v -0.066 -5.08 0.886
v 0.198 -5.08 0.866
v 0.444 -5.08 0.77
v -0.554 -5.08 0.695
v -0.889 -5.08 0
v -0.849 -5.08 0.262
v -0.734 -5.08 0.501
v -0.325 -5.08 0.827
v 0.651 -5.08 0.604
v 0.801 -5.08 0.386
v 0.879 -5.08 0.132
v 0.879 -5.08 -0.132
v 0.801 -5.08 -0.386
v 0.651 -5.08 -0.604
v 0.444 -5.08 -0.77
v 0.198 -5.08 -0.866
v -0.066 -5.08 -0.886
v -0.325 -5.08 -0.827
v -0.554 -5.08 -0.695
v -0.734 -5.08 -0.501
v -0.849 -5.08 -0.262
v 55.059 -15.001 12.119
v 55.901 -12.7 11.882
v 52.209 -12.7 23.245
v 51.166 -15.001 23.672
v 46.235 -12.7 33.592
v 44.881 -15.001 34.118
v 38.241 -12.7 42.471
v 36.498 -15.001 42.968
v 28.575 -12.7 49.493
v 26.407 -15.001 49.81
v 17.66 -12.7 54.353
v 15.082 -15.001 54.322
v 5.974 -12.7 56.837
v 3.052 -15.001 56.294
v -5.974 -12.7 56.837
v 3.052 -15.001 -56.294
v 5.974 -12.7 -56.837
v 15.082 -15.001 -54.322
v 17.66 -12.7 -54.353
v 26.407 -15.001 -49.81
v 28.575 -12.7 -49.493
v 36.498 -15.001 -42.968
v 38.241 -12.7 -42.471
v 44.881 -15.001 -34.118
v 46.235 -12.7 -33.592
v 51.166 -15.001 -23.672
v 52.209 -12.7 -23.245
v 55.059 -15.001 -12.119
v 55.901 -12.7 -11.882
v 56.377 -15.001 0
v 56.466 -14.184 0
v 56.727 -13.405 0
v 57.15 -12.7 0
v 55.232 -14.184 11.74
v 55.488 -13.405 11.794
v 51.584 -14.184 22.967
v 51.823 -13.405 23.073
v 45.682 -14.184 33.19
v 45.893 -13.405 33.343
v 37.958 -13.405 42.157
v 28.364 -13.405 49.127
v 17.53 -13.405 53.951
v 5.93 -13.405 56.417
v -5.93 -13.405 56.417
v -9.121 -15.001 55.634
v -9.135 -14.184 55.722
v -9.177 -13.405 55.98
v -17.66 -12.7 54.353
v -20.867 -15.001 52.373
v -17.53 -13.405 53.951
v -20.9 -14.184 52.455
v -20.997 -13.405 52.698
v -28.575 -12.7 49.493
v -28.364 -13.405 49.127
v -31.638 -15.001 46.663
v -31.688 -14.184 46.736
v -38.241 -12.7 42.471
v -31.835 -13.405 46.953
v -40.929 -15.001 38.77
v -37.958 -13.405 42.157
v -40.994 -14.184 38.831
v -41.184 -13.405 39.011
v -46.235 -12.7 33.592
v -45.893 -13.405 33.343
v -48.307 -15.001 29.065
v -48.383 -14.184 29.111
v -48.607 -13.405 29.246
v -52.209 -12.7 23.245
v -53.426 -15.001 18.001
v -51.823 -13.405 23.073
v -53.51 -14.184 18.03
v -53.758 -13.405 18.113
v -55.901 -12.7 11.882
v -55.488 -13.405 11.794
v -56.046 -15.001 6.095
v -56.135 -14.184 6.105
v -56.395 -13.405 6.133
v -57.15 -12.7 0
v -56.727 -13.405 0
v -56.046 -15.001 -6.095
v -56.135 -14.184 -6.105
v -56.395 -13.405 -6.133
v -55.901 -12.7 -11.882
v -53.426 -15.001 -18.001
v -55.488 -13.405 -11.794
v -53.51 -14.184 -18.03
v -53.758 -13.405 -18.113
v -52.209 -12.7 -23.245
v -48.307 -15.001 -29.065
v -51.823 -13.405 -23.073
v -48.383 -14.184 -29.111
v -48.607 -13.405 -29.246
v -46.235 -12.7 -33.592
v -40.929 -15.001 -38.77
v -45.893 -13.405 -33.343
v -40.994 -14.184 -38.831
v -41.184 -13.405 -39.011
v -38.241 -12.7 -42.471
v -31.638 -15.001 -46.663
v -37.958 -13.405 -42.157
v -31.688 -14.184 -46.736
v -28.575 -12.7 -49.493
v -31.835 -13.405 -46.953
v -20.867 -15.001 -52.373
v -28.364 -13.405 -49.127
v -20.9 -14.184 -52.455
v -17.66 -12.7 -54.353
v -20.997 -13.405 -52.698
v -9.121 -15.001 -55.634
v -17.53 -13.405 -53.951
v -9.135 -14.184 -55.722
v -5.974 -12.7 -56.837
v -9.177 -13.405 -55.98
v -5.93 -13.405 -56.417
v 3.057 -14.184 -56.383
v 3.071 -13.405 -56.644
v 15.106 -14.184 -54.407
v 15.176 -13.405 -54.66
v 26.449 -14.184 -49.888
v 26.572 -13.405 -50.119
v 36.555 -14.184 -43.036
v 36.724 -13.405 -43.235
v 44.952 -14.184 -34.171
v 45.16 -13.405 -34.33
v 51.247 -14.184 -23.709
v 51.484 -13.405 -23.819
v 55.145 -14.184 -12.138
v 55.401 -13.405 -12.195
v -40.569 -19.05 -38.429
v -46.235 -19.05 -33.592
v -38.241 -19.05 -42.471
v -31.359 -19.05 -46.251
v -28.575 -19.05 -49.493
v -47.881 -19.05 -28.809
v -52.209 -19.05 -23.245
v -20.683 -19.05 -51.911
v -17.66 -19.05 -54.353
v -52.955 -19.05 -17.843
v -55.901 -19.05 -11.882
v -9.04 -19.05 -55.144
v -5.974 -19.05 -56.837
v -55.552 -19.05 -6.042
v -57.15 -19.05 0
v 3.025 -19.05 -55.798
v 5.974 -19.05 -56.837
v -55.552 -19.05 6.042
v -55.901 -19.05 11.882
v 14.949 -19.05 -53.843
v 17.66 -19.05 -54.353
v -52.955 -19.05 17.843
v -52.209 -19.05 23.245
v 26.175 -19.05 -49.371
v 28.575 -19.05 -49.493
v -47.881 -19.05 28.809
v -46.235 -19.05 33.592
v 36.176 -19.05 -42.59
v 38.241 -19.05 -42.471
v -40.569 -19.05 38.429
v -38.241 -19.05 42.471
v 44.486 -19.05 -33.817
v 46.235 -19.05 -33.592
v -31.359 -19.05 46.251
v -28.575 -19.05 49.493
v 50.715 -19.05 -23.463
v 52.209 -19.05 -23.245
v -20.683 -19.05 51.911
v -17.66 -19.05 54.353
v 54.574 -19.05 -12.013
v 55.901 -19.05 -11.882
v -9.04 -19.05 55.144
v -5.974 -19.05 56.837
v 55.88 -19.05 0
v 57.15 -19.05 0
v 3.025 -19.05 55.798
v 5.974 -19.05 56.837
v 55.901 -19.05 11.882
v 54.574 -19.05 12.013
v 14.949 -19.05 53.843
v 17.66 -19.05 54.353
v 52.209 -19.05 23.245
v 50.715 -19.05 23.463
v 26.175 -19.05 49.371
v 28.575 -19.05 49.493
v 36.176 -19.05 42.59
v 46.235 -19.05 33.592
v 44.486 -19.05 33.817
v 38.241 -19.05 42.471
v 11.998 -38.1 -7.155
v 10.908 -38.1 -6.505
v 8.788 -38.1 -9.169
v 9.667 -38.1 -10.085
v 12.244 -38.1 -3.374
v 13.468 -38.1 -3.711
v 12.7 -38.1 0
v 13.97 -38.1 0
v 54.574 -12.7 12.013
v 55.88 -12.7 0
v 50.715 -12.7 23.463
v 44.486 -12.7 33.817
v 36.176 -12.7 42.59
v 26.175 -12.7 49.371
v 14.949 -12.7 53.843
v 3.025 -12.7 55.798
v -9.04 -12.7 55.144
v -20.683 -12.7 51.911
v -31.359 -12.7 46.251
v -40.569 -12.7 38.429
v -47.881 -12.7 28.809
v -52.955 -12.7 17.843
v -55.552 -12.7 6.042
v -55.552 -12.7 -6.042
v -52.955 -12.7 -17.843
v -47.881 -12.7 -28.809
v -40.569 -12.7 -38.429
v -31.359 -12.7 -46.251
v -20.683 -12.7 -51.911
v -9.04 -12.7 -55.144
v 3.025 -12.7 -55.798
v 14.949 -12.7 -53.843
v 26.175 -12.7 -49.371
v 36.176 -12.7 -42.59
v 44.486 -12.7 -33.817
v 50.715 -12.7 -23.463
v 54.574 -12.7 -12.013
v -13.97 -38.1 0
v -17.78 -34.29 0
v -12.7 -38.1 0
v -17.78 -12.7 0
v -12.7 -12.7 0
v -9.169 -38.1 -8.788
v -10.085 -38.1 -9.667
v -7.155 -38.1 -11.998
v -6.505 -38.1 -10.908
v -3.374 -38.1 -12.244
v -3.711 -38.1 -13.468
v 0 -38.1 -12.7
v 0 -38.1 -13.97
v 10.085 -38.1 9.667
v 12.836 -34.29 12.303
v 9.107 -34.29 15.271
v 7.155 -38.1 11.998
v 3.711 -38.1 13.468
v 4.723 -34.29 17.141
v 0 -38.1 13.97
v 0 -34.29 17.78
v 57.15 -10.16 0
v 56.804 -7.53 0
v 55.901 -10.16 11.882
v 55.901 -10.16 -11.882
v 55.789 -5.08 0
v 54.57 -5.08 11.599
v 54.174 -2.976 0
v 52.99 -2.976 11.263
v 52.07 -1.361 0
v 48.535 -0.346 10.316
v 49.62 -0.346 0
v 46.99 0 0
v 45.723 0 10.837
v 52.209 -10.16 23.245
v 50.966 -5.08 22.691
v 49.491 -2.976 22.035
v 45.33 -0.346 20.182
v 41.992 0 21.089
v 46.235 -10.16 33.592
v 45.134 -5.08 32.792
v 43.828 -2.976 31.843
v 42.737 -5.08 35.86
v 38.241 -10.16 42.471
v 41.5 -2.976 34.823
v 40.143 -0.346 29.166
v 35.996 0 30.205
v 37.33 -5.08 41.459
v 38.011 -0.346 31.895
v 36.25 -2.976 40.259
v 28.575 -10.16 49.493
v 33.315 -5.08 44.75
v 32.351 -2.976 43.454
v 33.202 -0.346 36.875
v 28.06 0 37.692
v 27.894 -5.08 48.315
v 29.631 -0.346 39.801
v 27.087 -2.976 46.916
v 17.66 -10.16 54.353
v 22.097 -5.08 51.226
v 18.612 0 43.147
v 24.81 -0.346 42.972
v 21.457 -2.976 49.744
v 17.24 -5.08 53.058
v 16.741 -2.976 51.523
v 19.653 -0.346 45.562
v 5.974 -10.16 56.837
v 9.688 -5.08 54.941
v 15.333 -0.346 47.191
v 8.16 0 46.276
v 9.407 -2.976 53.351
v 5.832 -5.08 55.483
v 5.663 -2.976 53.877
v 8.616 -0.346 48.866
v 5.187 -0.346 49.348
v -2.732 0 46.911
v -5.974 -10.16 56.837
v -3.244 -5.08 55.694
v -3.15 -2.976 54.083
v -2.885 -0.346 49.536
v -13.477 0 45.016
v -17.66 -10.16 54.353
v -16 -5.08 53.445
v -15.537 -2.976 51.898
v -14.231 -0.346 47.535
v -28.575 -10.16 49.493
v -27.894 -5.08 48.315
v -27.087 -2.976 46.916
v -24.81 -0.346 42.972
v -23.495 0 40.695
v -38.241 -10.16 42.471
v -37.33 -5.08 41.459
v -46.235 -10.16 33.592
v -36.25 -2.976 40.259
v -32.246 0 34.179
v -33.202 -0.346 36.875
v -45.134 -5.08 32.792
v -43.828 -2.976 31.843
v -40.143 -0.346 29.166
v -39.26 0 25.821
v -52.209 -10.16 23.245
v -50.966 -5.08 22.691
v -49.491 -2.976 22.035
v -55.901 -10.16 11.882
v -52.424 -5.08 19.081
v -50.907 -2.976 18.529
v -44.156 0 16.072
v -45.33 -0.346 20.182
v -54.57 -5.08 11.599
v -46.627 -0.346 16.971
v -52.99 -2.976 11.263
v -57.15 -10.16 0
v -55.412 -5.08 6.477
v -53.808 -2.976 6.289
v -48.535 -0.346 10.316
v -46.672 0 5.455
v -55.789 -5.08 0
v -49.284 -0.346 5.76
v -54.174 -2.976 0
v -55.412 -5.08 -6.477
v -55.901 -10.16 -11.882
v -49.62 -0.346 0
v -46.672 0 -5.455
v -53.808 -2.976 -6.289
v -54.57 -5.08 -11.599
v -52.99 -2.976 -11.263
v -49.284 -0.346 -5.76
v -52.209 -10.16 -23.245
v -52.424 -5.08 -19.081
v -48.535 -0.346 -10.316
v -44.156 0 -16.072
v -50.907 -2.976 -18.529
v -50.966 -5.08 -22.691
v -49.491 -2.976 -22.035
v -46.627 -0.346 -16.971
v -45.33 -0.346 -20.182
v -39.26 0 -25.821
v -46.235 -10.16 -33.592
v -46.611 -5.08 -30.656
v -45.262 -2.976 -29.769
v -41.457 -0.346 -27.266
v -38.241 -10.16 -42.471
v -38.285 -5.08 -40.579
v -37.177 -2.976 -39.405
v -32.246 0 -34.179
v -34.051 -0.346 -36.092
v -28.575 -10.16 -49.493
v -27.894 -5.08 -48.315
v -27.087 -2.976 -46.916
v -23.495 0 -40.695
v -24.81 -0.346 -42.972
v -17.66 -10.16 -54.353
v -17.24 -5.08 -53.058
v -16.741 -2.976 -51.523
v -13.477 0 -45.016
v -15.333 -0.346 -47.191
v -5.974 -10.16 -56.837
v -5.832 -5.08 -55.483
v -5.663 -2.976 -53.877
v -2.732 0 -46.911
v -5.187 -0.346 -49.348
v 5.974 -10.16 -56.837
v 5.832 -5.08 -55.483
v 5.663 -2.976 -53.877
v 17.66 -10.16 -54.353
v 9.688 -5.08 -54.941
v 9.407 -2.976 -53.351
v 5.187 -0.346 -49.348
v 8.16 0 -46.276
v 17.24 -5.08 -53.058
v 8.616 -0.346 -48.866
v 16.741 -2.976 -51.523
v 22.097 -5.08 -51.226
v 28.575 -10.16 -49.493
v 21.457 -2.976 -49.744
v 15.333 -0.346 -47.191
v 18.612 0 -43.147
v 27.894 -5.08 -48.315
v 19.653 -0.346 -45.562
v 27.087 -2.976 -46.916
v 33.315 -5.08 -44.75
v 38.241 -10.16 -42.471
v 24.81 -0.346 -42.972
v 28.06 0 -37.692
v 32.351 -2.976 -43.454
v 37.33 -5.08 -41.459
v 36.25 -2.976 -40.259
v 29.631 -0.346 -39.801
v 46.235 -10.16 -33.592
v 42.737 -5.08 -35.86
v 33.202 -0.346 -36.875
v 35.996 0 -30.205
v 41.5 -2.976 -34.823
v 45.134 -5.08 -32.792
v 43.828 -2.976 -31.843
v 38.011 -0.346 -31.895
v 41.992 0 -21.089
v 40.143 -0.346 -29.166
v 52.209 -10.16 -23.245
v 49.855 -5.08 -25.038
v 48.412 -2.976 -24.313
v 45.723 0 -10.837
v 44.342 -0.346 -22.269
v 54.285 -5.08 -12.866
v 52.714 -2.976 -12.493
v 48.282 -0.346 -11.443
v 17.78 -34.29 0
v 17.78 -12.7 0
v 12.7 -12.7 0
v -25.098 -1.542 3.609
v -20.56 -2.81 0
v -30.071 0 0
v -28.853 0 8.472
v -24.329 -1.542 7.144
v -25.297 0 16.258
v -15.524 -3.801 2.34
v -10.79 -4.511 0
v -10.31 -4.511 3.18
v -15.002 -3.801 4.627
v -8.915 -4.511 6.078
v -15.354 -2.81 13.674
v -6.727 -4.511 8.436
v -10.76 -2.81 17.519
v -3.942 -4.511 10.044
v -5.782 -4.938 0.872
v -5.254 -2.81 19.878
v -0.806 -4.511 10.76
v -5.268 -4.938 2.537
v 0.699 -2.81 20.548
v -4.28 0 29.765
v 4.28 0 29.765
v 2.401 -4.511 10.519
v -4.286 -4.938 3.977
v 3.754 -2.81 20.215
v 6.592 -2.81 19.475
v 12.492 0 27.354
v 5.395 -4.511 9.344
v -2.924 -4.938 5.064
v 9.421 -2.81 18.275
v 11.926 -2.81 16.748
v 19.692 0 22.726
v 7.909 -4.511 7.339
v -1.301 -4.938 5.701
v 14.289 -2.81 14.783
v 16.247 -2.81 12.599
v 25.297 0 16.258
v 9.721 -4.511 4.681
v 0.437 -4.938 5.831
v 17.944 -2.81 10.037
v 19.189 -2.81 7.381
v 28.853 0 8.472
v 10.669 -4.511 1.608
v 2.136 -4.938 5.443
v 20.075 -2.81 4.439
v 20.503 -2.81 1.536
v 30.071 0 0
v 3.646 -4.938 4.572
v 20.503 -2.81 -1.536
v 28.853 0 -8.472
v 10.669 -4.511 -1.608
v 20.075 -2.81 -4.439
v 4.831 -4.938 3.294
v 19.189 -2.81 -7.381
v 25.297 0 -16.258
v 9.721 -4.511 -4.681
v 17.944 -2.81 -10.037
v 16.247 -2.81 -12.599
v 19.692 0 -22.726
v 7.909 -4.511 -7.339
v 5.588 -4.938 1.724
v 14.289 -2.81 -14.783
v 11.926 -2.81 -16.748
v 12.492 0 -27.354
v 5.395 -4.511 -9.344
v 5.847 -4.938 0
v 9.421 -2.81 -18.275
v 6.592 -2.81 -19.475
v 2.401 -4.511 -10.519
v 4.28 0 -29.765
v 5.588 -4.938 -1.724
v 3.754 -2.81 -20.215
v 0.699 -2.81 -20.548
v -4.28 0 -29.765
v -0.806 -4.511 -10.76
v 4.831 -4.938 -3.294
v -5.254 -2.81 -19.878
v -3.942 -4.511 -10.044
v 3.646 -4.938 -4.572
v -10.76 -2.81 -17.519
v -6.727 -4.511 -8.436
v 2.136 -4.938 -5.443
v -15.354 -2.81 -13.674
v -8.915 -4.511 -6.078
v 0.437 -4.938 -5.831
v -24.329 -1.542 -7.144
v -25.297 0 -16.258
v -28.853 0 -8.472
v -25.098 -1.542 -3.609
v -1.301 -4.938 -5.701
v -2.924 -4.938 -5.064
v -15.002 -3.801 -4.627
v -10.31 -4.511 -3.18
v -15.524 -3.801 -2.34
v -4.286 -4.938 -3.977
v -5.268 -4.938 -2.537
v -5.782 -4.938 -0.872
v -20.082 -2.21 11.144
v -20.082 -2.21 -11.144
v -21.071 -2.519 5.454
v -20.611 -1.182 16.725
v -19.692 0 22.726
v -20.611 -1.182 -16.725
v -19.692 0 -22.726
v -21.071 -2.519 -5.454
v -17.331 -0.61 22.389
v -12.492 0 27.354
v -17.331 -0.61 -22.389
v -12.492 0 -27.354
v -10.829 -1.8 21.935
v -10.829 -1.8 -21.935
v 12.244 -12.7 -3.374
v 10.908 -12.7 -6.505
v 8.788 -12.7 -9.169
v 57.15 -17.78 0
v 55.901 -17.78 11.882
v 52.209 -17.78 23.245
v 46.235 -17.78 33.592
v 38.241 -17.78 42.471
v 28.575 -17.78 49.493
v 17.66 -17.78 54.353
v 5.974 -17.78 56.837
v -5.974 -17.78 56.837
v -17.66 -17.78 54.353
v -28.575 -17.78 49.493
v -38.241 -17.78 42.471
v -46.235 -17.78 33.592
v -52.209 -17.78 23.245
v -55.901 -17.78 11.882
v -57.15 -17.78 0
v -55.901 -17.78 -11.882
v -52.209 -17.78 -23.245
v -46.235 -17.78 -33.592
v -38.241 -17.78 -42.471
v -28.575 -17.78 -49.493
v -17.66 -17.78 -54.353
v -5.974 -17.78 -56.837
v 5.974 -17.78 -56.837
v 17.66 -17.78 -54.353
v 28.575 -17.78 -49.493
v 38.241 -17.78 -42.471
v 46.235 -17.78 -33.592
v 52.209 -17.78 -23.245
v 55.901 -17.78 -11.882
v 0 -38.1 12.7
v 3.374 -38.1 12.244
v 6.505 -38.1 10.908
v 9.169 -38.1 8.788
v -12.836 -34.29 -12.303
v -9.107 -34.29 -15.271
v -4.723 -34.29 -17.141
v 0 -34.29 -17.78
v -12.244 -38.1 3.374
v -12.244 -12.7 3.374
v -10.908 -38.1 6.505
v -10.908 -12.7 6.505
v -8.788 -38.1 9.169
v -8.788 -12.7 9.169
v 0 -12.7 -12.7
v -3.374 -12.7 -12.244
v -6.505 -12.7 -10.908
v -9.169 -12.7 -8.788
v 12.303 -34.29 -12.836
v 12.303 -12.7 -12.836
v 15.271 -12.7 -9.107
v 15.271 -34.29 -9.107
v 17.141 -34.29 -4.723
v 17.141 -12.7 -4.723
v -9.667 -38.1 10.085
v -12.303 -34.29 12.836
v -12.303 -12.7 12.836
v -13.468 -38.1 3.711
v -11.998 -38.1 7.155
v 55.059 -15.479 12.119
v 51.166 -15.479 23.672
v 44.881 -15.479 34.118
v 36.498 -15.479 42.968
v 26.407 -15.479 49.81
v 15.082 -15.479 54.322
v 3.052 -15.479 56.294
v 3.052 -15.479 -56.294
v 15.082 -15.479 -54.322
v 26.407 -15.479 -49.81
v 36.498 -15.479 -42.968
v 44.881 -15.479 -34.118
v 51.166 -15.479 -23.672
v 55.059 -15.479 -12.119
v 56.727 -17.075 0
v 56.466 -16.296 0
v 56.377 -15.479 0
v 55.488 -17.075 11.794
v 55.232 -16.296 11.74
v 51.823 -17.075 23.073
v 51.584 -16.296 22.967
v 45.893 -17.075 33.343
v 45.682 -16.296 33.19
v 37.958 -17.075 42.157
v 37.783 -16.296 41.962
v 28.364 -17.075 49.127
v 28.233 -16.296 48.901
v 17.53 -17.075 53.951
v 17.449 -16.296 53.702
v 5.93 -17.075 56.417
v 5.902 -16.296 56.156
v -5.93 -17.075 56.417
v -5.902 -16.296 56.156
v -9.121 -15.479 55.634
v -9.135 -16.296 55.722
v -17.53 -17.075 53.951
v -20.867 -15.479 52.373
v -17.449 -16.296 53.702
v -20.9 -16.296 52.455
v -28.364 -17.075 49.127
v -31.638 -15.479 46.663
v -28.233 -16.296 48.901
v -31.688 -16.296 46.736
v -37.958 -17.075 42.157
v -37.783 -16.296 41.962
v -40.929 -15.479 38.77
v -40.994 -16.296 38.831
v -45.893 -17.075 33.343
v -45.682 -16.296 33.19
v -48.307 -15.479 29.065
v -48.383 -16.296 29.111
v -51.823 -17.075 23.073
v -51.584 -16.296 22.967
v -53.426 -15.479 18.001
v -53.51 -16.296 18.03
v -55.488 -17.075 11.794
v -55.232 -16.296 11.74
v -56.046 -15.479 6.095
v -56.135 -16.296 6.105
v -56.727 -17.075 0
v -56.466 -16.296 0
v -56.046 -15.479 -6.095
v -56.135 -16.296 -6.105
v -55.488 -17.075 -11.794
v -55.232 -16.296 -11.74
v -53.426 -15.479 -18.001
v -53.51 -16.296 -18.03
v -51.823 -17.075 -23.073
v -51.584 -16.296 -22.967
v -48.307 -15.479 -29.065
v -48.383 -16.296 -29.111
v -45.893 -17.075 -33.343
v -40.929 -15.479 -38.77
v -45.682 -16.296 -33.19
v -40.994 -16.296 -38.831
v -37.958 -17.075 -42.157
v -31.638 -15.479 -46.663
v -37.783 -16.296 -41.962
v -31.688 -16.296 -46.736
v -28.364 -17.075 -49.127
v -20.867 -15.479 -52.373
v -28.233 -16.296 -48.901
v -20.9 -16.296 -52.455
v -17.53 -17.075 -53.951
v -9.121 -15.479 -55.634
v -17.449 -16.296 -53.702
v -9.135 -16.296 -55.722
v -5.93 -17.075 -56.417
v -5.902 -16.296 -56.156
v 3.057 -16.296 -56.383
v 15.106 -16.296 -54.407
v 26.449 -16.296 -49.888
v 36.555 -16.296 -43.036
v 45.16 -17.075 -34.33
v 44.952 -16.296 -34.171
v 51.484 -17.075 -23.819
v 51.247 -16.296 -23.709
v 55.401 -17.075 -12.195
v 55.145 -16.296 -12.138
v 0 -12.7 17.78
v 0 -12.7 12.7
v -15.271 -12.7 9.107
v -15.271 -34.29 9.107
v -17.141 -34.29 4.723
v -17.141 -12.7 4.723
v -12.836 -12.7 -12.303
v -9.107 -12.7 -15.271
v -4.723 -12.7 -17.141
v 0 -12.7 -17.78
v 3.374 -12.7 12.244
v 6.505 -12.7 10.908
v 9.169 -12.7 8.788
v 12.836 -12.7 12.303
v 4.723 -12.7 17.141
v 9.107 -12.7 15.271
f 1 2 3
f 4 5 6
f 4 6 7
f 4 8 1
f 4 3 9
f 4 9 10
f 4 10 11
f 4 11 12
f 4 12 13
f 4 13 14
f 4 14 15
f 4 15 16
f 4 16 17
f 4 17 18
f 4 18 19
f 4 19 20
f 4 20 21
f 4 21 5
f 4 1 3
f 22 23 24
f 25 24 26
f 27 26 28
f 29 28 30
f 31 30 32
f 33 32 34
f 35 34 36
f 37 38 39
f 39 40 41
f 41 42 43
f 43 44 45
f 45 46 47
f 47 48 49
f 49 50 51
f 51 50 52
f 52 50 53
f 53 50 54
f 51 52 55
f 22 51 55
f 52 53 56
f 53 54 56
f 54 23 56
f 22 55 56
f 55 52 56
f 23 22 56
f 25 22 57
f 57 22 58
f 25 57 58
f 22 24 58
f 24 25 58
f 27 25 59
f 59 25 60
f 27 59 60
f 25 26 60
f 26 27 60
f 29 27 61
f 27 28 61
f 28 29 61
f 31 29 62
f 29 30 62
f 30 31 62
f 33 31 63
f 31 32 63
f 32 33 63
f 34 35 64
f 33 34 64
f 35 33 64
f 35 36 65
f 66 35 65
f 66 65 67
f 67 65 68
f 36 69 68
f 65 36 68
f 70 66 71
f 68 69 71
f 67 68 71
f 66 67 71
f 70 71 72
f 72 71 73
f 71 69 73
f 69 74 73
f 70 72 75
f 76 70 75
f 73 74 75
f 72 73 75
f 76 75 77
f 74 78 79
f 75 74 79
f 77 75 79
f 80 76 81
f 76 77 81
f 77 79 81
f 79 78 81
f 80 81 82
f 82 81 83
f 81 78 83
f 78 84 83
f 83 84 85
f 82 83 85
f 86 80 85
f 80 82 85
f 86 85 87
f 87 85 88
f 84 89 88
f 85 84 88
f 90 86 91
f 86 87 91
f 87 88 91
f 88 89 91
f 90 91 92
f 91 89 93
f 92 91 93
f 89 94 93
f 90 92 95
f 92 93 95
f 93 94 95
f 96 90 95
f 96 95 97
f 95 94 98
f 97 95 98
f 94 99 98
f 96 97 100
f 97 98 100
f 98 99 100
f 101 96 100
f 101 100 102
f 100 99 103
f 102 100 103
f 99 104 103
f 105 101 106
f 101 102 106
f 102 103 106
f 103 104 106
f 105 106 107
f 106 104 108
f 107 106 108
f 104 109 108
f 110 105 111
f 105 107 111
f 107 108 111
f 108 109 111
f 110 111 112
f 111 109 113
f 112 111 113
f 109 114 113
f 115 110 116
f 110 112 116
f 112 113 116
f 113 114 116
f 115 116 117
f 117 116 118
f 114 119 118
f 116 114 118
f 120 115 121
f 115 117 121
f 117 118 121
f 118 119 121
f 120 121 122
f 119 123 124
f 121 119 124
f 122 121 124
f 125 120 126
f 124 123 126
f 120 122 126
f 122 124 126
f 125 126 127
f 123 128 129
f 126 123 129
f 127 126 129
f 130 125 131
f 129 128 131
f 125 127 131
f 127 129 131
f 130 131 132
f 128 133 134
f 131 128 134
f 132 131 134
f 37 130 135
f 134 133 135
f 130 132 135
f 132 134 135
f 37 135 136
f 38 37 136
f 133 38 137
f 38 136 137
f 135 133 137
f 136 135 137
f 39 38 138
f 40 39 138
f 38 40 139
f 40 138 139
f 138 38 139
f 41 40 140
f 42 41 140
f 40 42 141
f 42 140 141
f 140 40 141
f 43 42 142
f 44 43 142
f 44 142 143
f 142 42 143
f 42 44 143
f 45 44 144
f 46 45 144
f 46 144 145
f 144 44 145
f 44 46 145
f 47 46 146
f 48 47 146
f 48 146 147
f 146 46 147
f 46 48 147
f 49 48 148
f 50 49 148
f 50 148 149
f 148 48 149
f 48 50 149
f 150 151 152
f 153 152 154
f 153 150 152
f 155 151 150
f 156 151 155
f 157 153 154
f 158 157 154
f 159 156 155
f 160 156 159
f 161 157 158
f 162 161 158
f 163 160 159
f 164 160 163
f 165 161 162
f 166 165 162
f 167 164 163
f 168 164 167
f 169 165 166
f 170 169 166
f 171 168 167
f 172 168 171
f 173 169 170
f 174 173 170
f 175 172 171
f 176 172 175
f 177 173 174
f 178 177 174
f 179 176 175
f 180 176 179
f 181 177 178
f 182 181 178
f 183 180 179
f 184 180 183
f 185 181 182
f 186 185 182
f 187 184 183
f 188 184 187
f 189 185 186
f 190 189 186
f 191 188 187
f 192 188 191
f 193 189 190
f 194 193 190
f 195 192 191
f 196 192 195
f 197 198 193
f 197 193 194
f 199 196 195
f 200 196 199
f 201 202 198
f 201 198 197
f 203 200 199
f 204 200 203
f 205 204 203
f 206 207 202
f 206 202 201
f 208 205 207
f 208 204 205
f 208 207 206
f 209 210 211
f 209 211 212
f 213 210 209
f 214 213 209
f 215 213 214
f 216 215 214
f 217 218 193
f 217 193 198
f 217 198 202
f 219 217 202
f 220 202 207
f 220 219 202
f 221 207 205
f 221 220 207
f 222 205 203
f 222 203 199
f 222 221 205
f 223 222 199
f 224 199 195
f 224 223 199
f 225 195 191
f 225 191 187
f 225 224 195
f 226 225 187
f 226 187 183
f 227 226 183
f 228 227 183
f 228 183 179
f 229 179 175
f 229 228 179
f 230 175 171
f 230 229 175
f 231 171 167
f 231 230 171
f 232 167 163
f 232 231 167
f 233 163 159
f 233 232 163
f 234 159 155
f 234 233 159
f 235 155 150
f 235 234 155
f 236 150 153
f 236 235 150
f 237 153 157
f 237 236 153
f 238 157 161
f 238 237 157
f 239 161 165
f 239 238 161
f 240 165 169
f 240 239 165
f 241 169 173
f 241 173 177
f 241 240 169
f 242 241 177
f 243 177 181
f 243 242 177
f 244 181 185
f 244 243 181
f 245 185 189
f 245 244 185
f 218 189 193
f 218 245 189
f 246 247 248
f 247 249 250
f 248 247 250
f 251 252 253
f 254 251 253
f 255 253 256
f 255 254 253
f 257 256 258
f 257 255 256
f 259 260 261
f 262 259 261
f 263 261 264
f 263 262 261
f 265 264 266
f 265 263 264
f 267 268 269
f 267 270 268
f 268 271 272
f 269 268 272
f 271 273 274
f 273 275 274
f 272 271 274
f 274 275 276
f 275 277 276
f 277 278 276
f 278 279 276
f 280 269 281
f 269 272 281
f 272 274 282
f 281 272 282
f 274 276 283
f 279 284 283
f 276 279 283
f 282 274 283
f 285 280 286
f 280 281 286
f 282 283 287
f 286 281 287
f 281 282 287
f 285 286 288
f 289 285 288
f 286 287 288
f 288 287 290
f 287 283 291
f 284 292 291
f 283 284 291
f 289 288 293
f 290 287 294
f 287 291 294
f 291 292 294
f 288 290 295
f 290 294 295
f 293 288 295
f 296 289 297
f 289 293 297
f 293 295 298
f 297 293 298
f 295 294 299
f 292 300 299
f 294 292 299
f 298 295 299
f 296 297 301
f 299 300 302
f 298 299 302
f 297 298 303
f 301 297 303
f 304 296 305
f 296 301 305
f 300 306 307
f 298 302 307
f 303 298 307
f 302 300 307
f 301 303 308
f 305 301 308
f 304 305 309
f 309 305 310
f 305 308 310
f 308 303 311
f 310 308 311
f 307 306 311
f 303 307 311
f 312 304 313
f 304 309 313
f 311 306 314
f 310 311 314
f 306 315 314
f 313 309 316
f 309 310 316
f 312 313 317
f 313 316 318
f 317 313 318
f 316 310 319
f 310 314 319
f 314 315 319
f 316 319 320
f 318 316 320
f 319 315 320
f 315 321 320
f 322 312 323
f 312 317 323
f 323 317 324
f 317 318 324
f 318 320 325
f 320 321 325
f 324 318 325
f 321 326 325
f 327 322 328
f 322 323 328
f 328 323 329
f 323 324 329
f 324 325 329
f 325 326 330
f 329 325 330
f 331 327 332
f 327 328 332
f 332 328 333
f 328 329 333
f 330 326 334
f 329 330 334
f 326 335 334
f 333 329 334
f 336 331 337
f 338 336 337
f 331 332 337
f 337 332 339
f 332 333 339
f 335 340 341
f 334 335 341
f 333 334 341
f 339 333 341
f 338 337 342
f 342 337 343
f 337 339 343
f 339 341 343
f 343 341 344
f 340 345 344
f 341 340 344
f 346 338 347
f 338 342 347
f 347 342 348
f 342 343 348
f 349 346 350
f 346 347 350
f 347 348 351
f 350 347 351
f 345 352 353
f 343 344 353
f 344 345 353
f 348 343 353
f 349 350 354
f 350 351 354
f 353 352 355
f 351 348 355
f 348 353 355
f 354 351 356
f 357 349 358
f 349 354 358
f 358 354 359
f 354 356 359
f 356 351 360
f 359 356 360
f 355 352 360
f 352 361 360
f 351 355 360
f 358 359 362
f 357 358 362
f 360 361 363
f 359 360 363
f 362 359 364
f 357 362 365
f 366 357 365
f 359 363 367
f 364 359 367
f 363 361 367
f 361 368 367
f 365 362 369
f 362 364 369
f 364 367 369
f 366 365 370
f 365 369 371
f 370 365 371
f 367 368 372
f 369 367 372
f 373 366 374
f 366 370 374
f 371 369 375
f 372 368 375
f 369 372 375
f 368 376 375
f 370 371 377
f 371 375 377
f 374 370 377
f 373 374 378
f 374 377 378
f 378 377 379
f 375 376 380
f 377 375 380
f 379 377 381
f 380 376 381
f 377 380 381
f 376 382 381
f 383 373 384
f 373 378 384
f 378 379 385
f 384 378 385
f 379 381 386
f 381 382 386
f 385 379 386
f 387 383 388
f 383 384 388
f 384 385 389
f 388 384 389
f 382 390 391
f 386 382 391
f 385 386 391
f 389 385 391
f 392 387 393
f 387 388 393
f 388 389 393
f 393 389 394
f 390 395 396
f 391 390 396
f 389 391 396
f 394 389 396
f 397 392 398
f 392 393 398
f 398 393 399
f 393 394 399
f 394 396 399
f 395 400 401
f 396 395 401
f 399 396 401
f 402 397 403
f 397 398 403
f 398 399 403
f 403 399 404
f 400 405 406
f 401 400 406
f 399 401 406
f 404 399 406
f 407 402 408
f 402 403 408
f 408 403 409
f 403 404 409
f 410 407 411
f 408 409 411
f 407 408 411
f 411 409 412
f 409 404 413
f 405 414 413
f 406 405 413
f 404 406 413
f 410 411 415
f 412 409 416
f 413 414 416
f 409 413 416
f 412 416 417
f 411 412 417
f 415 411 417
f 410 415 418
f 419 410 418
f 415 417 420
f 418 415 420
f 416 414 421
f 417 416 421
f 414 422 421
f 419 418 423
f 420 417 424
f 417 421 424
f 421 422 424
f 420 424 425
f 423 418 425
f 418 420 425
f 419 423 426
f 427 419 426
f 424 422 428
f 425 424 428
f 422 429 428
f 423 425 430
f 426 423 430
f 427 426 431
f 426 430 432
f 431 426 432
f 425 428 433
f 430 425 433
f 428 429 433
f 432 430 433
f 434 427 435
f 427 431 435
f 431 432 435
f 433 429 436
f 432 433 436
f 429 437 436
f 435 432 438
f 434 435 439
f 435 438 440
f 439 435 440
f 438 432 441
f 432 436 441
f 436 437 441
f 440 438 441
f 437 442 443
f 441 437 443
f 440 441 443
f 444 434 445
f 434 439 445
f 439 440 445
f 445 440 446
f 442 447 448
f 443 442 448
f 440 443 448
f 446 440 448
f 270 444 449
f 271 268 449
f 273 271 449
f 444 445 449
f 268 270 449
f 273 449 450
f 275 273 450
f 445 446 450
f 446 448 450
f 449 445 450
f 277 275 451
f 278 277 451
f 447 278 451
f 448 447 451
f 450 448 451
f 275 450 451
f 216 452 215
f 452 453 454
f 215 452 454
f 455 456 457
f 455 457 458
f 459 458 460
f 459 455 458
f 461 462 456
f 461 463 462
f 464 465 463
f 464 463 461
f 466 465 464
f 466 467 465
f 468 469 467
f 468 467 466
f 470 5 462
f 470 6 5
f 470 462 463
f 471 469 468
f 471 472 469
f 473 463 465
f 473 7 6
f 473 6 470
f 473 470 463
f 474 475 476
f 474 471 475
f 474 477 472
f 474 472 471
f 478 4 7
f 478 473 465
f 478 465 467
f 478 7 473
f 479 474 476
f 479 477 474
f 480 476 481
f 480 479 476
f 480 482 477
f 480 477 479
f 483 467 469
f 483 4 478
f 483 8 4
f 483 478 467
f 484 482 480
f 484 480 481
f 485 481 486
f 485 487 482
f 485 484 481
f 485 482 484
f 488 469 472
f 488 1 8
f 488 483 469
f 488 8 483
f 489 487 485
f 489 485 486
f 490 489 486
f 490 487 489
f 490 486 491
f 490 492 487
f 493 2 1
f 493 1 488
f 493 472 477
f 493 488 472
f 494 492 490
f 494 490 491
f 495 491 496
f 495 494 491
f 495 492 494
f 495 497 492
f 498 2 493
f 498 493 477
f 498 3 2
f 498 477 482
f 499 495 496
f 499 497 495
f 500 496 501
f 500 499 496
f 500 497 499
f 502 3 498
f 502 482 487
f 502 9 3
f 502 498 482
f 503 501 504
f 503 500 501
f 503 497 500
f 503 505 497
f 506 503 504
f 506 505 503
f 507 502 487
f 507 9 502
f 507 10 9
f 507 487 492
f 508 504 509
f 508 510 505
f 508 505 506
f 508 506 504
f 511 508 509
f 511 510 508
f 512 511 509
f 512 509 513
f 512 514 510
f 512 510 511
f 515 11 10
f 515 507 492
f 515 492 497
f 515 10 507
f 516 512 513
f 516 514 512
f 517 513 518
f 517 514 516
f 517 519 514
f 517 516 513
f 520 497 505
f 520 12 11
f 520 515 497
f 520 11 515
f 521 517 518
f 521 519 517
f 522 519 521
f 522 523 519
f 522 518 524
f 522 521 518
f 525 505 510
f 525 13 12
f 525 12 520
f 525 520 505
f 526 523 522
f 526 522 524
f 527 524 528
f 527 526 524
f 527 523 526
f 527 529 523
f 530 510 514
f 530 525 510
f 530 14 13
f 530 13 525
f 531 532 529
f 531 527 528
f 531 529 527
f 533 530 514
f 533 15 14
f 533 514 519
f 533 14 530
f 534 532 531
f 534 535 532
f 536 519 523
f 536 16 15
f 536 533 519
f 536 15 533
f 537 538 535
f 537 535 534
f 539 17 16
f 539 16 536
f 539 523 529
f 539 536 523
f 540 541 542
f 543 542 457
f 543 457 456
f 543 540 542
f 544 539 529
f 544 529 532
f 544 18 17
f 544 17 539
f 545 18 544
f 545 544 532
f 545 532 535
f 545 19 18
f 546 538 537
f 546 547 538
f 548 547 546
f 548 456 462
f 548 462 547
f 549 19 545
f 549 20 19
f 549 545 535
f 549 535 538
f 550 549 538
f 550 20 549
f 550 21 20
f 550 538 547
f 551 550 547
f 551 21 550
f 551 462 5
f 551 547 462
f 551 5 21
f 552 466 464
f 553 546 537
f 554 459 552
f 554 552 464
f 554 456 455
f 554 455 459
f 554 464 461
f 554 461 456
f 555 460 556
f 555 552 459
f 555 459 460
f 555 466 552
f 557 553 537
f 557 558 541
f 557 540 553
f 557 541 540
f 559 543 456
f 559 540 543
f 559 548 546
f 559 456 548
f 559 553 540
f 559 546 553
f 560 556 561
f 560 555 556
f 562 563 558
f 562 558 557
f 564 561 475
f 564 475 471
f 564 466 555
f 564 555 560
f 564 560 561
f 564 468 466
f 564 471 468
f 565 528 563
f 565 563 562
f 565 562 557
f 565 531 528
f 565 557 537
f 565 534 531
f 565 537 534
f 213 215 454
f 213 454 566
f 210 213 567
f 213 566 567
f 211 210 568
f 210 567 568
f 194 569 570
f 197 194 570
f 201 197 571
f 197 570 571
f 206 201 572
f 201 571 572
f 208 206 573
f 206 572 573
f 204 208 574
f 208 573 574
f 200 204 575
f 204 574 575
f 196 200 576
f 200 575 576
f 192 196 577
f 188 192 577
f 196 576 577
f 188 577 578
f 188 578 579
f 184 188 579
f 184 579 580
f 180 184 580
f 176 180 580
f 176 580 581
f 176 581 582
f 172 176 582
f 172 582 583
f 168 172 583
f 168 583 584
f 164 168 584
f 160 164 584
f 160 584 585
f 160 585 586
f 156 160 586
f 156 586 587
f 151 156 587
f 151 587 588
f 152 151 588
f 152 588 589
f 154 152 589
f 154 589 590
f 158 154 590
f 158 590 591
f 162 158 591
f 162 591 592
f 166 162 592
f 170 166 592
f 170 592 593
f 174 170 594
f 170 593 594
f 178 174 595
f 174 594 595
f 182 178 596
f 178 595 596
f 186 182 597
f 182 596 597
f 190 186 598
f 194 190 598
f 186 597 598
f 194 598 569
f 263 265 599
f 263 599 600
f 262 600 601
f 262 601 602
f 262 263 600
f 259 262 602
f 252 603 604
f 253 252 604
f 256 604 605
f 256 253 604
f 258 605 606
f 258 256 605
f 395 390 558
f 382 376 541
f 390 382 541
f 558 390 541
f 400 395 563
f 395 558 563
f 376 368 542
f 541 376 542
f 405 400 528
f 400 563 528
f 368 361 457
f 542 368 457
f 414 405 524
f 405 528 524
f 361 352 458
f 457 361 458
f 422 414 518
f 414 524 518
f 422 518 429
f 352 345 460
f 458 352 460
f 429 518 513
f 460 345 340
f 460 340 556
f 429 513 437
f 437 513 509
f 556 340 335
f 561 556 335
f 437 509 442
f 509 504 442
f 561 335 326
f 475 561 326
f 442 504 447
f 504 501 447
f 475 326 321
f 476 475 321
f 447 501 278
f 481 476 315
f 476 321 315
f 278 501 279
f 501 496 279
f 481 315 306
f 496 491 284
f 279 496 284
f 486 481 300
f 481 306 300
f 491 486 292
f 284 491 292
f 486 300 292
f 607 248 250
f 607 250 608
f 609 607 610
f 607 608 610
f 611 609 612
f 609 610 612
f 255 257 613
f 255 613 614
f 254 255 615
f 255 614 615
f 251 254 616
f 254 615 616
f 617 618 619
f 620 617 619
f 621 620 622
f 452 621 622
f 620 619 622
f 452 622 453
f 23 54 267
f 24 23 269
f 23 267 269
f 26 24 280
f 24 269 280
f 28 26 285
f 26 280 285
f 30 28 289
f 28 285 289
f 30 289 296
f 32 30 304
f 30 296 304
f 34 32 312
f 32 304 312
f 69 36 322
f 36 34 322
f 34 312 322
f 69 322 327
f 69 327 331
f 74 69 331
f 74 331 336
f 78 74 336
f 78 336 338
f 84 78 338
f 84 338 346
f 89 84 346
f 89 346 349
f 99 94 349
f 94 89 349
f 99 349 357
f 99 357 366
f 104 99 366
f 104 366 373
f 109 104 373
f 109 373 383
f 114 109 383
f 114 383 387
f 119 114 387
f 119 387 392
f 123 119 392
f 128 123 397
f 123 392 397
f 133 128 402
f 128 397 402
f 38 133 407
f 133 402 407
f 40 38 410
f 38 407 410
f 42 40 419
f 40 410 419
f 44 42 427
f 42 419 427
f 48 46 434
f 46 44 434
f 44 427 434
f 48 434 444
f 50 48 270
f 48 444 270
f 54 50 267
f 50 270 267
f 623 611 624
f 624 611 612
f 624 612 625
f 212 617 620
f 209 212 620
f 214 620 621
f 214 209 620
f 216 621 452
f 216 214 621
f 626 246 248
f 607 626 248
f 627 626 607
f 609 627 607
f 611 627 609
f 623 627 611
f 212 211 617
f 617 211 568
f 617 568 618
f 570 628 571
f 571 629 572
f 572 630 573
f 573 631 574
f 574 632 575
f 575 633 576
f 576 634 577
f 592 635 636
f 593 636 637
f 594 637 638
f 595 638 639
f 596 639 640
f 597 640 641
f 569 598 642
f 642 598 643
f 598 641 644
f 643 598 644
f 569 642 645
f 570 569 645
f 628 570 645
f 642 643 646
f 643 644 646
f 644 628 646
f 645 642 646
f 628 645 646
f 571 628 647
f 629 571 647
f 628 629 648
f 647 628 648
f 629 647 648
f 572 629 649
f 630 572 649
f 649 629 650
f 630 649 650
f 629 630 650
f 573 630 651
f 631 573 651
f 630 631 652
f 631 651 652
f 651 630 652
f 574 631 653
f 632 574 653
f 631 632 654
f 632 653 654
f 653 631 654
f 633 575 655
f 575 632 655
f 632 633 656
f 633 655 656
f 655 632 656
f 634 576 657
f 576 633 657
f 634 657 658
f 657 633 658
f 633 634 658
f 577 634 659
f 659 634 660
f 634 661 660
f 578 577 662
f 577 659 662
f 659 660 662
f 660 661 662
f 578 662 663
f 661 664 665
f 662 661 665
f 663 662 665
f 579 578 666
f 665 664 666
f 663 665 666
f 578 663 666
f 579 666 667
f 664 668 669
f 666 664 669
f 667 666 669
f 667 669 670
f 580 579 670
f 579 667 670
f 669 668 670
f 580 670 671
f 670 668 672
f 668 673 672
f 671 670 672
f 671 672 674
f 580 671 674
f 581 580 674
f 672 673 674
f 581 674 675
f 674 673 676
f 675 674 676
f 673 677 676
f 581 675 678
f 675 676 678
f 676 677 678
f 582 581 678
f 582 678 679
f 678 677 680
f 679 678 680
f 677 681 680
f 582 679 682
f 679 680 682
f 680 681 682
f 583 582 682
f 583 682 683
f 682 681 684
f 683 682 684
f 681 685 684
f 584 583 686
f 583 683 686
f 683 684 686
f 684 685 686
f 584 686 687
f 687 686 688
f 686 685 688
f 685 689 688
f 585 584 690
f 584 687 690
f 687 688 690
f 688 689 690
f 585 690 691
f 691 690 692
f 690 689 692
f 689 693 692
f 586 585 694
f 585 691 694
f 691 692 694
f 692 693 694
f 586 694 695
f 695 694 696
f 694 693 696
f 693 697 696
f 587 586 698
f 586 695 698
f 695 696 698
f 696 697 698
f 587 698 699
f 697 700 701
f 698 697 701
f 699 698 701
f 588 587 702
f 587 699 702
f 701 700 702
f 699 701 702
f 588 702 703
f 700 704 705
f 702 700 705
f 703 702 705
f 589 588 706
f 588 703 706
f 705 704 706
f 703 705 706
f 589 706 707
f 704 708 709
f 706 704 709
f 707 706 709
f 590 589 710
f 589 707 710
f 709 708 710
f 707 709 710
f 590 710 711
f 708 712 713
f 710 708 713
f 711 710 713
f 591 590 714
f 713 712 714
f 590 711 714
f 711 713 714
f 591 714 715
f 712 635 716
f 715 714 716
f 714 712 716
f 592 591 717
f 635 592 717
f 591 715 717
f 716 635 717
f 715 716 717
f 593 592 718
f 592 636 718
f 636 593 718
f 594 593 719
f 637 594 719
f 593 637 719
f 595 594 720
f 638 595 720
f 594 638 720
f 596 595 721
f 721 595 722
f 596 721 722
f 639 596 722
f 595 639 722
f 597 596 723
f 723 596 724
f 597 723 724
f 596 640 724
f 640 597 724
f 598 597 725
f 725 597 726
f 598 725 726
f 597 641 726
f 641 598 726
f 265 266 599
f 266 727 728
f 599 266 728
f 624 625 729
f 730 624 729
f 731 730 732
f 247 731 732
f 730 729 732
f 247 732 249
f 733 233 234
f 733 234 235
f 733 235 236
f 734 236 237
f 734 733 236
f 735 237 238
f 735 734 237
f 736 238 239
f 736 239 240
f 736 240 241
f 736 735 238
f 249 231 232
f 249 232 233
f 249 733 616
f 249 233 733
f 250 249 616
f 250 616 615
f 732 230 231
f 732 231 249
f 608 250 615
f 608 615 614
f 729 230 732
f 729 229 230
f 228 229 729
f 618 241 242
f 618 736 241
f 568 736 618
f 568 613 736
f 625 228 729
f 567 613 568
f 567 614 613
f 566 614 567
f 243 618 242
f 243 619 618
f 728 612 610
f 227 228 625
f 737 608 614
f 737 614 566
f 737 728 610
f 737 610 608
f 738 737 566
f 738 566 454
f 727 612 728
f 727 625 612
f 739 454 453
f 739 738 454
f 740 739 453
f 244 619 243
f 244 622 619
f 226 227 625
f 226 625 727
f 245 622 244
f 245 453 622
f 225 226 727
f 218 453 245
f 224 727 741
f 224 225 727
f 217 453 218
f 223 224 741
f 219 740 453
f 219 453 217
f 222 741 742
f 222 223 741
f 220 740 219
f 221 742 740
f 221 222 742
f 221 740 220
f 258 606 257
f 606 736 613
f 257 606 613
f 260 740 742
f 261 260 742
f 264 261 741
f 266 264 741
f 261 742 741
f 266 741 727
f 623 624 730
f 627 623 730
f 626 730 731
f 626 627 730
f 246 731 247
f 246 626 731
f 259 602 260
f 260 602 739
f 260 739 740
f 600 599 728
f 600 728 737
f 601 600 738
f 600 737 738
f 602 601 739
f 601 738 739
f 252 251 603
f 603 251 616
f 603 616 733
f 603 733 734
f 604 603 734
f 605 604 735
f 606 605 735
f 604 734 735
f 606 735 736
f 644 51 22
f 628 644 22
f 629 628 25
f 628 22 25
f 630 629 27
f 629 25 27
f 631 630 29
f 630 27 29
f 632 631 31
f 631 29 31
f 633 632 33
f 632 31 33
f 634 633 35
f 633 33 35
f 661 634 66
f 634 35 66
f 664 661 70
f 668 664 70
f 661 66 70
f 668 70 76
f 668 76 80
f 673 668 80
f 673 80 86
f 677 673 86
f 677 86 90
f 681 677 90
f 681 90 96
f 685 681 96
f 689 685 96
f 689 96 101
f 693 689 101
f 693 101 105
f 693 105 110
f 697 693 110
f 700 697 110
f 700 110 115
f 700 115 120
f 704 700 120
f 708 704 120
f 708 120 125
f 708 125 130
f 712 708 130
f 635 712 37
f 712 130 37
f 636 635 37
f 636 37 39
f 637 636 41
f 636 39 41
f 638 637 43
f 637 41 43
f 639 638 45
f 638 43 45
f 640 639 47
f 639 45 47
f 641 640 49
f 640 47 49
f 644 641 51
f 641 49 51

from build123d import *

# Parameters (mm, degrees)
F0_R      = 57.15
F0_R_2    = 54.61
F1_DEPTH  = 12.7
F2_R      = 57.15
F2_R_2    = 55.88
F3_DEPTH  = 6.35
F5_DEPTH  = 25.4
F6_R      = 10.16
F8_R      = 57.3643246116
F8_R_2    = 56.3769302999
F9_DEPTH  = 5.08
F11_SIZE  = 3.81
F12_R     = 30.0710840357
F13_DEPTH = 5.08


# Not quite as in the source:
# - a fillet or chamfer that OpenCascade refuses, or shapes differently, is made with other operations: its cross-section is extruded or revolved along the edge and cut away or added
# - a feature names something its author has since deleted; it is built from what else it names


with BuildPart() as f1:
    # F0 (on Front) → F1 (new body)
    with BuildSketch(Plane.XZ):
        Circle(F0_R)
        Circle(F0_R_2, mode=Mode.SUBTRACT)
        Circle(F0_R_2)
    extrude(amount=F1_DEPTH)

    # F2 (on face) → F3 (join)
    with BuildSketch(Plane.XZ.offset(12.7)):
        Circle(F2_R)
        Circle(F2_R_2, mode=Mode.SUBTRACT)
    extrude(amount=F3_DEPTH)

    # F4 (on face) → F5 (join)
    with BuildSketch(Plane.XZ.offset(12.7)):
        with BuildLine():
            Line((9.1685925479, 8.7878843126), (12.836029567, 12.3030380376))
            ThreePointArc((12.836029567, 12.3030380376), (6.9778357566, 16.3535380928), (0, 17.78))
            Line((0, 17.78), (0, 12.7))
            ThreePointArc((0, 12.7), (4.9841683976, 11.6810986377), (9.1685925479, 8.7878843126))
        make_face()
        with BuildLine():
            ThreePointArc((12.3030380376, -12.836029567), (16.3535380928, -6.9778357566), (17.78, 0))
            Line((17.78, 0), (12.7, 0))
            ThreePointArc((12.7, 0), (11.6810986377, -4.9841683976), (8.7878843126, -9.1685925479))
            Line((8.7878843126, -9.1685925479), (12.3030380376, -12.836029567))
        make_face()
        with BuildLine():
            ThreePointArc((-12.836029567, -12.3030380376), (-6.9778357566, -16.3535380928), (0, -17.78))
            Line((0, -17.78), (0, -12.7))
            ThreePointArc((0, -12.7), (-4.9841683976, -11.6810986377), (-9.1685925479, -8.7878843126))
            Line((-9.1685925479, -8.7878843126), (-12.836029567, -12.3030380376))
        make_face()
        with BuildLine():
            Line((-8.7878843126, 9.1685925479), (-12.3030380376, 12.836029567))
            ThreePointArc((-12.3030380376, 12.836029567), (-16.3535380928, 6.9778357566), (-17.78, 0))
            Line((-17.78, 0), (-12.7, 0))
            ThreePointArc((-12.7, 0), (-11.6810986377, 4.9841683976), (-8.7878843126, 9.1685925479))
        make_face()
    extrude(amount=F5_DEPTH)

    # F6
    f6_edges = [f1.edges().sort_by_distance(p)[0] for p in [
        (-57.15, 0, 0),
    ]]
    fillet(f6_edges, radius=F6_R)

    # F8 (on offset) → F9 (cut)
    with BuildSketch(Plane.XZ.offset(12.7)):
        Circle(F8_R)
        Circle(F8_R_2, mode=Mode.SUBTRACT)
    extrude(amount=F9_DEPTH, mode=Mode.SUBTRACT)

    # F10: fillet of radius 3.81 on 3 edges, made by hand

    # F10_s1 → F10_t2 (revolve)
    with BuildSketch(Plane.XY):
        with BuildLine():
            ThreePointArc((56.3769302999, -15.0006856268), (56.5753652345, -13.7871380263), (57.15, -12.7))
            Line((57.15, -12.7), (57.089261394, -12.6539862875))
            ThreePointArc((57.089261394, -12.6539862875), (56.7634651499, -12.6238), (56.3769302999, -12.6238))
            Line((56.3769302999, -12.6238), (56.3007302999, -12.7))
            Line((56.3007302999, -12.7), (56.3007302999, -15.0006856268))
            Line((56.3007302999, -15.0006856268), (56.3769302999, -15.0006856268))
        make_face()
    revolve(axis=Axis((0, -12.7, 0), (0, -1, 0)))

    # F10_s3 → F10_t4 (revolve)
    with BuildSketch(Plane.XY):
        with BuildLine():
            ThreePointArc((57.15, -17.78), (56.5753652345, -16.6928619737), (56.3769302999, -15.4793143732))
            Line((56.3769302999, -15.4793143732), (56.3007302999, -15.4793143732))
            Line((56.3007302999, -15.4793143732), (56.3007302999, -17.78))
            Line((56.3007302999, -17.78), (56.3769302999, -17.8562))
            ThreePointArc((56.3769302999, -17.8562), (56.7634651499, -17.8562), (57.089261394, -17.8260137125))
            Line((57.089261394, -17.8260137125), (57.15, -17.78))
        make_face()
    revolve(axis=Axis((0, -17.78, 0), (0, -1, 0)))

    # F11
    f11_edges = [f1.edges().sort_by_distance(p)[0] for p in [
        (-16.353538, -38.1, 6.977836),
        (-6.977836, -38.1, -16.353538),
        (16.353538, -38.1, -6.977836),
        (6.977836, -38.1, 16.353538),
    ]]
    chamfer(f11_edges, length=F11_SIZE)

    # F12 (on face) → F13 (cut)
    with BuildSketch(Plane(origin=(0, 0, 0), x_dir=(-1, 0, 0), z_dir=(0, 1, 0))):
        Circle(F12_R)
    extrude(amount=-F13_DEPTH, mode=Mode.SUBTRACT)

    # F14: fillet of radius 86.36 on 1 edges, made by hand

    # F14_s1 → F14_t2 (revolve)
    with BuildSketch(Plane.XY):
        with BuildLine():
            ThreePointArc((-30.0710840357, 0), (-15.6993236042, -3.8005218602), (-0.8887057913, -5.08))
            Line((-0.8887057913, -5.08), (-30.0710840357, -5.08))
            Line((-30.0710840357, -5.08), (-30.0710840357, 0))
        make_face()
    revolve(axis=Axis((0, -5.08, 0), (0, 1, 0)))


solid = f1.part
